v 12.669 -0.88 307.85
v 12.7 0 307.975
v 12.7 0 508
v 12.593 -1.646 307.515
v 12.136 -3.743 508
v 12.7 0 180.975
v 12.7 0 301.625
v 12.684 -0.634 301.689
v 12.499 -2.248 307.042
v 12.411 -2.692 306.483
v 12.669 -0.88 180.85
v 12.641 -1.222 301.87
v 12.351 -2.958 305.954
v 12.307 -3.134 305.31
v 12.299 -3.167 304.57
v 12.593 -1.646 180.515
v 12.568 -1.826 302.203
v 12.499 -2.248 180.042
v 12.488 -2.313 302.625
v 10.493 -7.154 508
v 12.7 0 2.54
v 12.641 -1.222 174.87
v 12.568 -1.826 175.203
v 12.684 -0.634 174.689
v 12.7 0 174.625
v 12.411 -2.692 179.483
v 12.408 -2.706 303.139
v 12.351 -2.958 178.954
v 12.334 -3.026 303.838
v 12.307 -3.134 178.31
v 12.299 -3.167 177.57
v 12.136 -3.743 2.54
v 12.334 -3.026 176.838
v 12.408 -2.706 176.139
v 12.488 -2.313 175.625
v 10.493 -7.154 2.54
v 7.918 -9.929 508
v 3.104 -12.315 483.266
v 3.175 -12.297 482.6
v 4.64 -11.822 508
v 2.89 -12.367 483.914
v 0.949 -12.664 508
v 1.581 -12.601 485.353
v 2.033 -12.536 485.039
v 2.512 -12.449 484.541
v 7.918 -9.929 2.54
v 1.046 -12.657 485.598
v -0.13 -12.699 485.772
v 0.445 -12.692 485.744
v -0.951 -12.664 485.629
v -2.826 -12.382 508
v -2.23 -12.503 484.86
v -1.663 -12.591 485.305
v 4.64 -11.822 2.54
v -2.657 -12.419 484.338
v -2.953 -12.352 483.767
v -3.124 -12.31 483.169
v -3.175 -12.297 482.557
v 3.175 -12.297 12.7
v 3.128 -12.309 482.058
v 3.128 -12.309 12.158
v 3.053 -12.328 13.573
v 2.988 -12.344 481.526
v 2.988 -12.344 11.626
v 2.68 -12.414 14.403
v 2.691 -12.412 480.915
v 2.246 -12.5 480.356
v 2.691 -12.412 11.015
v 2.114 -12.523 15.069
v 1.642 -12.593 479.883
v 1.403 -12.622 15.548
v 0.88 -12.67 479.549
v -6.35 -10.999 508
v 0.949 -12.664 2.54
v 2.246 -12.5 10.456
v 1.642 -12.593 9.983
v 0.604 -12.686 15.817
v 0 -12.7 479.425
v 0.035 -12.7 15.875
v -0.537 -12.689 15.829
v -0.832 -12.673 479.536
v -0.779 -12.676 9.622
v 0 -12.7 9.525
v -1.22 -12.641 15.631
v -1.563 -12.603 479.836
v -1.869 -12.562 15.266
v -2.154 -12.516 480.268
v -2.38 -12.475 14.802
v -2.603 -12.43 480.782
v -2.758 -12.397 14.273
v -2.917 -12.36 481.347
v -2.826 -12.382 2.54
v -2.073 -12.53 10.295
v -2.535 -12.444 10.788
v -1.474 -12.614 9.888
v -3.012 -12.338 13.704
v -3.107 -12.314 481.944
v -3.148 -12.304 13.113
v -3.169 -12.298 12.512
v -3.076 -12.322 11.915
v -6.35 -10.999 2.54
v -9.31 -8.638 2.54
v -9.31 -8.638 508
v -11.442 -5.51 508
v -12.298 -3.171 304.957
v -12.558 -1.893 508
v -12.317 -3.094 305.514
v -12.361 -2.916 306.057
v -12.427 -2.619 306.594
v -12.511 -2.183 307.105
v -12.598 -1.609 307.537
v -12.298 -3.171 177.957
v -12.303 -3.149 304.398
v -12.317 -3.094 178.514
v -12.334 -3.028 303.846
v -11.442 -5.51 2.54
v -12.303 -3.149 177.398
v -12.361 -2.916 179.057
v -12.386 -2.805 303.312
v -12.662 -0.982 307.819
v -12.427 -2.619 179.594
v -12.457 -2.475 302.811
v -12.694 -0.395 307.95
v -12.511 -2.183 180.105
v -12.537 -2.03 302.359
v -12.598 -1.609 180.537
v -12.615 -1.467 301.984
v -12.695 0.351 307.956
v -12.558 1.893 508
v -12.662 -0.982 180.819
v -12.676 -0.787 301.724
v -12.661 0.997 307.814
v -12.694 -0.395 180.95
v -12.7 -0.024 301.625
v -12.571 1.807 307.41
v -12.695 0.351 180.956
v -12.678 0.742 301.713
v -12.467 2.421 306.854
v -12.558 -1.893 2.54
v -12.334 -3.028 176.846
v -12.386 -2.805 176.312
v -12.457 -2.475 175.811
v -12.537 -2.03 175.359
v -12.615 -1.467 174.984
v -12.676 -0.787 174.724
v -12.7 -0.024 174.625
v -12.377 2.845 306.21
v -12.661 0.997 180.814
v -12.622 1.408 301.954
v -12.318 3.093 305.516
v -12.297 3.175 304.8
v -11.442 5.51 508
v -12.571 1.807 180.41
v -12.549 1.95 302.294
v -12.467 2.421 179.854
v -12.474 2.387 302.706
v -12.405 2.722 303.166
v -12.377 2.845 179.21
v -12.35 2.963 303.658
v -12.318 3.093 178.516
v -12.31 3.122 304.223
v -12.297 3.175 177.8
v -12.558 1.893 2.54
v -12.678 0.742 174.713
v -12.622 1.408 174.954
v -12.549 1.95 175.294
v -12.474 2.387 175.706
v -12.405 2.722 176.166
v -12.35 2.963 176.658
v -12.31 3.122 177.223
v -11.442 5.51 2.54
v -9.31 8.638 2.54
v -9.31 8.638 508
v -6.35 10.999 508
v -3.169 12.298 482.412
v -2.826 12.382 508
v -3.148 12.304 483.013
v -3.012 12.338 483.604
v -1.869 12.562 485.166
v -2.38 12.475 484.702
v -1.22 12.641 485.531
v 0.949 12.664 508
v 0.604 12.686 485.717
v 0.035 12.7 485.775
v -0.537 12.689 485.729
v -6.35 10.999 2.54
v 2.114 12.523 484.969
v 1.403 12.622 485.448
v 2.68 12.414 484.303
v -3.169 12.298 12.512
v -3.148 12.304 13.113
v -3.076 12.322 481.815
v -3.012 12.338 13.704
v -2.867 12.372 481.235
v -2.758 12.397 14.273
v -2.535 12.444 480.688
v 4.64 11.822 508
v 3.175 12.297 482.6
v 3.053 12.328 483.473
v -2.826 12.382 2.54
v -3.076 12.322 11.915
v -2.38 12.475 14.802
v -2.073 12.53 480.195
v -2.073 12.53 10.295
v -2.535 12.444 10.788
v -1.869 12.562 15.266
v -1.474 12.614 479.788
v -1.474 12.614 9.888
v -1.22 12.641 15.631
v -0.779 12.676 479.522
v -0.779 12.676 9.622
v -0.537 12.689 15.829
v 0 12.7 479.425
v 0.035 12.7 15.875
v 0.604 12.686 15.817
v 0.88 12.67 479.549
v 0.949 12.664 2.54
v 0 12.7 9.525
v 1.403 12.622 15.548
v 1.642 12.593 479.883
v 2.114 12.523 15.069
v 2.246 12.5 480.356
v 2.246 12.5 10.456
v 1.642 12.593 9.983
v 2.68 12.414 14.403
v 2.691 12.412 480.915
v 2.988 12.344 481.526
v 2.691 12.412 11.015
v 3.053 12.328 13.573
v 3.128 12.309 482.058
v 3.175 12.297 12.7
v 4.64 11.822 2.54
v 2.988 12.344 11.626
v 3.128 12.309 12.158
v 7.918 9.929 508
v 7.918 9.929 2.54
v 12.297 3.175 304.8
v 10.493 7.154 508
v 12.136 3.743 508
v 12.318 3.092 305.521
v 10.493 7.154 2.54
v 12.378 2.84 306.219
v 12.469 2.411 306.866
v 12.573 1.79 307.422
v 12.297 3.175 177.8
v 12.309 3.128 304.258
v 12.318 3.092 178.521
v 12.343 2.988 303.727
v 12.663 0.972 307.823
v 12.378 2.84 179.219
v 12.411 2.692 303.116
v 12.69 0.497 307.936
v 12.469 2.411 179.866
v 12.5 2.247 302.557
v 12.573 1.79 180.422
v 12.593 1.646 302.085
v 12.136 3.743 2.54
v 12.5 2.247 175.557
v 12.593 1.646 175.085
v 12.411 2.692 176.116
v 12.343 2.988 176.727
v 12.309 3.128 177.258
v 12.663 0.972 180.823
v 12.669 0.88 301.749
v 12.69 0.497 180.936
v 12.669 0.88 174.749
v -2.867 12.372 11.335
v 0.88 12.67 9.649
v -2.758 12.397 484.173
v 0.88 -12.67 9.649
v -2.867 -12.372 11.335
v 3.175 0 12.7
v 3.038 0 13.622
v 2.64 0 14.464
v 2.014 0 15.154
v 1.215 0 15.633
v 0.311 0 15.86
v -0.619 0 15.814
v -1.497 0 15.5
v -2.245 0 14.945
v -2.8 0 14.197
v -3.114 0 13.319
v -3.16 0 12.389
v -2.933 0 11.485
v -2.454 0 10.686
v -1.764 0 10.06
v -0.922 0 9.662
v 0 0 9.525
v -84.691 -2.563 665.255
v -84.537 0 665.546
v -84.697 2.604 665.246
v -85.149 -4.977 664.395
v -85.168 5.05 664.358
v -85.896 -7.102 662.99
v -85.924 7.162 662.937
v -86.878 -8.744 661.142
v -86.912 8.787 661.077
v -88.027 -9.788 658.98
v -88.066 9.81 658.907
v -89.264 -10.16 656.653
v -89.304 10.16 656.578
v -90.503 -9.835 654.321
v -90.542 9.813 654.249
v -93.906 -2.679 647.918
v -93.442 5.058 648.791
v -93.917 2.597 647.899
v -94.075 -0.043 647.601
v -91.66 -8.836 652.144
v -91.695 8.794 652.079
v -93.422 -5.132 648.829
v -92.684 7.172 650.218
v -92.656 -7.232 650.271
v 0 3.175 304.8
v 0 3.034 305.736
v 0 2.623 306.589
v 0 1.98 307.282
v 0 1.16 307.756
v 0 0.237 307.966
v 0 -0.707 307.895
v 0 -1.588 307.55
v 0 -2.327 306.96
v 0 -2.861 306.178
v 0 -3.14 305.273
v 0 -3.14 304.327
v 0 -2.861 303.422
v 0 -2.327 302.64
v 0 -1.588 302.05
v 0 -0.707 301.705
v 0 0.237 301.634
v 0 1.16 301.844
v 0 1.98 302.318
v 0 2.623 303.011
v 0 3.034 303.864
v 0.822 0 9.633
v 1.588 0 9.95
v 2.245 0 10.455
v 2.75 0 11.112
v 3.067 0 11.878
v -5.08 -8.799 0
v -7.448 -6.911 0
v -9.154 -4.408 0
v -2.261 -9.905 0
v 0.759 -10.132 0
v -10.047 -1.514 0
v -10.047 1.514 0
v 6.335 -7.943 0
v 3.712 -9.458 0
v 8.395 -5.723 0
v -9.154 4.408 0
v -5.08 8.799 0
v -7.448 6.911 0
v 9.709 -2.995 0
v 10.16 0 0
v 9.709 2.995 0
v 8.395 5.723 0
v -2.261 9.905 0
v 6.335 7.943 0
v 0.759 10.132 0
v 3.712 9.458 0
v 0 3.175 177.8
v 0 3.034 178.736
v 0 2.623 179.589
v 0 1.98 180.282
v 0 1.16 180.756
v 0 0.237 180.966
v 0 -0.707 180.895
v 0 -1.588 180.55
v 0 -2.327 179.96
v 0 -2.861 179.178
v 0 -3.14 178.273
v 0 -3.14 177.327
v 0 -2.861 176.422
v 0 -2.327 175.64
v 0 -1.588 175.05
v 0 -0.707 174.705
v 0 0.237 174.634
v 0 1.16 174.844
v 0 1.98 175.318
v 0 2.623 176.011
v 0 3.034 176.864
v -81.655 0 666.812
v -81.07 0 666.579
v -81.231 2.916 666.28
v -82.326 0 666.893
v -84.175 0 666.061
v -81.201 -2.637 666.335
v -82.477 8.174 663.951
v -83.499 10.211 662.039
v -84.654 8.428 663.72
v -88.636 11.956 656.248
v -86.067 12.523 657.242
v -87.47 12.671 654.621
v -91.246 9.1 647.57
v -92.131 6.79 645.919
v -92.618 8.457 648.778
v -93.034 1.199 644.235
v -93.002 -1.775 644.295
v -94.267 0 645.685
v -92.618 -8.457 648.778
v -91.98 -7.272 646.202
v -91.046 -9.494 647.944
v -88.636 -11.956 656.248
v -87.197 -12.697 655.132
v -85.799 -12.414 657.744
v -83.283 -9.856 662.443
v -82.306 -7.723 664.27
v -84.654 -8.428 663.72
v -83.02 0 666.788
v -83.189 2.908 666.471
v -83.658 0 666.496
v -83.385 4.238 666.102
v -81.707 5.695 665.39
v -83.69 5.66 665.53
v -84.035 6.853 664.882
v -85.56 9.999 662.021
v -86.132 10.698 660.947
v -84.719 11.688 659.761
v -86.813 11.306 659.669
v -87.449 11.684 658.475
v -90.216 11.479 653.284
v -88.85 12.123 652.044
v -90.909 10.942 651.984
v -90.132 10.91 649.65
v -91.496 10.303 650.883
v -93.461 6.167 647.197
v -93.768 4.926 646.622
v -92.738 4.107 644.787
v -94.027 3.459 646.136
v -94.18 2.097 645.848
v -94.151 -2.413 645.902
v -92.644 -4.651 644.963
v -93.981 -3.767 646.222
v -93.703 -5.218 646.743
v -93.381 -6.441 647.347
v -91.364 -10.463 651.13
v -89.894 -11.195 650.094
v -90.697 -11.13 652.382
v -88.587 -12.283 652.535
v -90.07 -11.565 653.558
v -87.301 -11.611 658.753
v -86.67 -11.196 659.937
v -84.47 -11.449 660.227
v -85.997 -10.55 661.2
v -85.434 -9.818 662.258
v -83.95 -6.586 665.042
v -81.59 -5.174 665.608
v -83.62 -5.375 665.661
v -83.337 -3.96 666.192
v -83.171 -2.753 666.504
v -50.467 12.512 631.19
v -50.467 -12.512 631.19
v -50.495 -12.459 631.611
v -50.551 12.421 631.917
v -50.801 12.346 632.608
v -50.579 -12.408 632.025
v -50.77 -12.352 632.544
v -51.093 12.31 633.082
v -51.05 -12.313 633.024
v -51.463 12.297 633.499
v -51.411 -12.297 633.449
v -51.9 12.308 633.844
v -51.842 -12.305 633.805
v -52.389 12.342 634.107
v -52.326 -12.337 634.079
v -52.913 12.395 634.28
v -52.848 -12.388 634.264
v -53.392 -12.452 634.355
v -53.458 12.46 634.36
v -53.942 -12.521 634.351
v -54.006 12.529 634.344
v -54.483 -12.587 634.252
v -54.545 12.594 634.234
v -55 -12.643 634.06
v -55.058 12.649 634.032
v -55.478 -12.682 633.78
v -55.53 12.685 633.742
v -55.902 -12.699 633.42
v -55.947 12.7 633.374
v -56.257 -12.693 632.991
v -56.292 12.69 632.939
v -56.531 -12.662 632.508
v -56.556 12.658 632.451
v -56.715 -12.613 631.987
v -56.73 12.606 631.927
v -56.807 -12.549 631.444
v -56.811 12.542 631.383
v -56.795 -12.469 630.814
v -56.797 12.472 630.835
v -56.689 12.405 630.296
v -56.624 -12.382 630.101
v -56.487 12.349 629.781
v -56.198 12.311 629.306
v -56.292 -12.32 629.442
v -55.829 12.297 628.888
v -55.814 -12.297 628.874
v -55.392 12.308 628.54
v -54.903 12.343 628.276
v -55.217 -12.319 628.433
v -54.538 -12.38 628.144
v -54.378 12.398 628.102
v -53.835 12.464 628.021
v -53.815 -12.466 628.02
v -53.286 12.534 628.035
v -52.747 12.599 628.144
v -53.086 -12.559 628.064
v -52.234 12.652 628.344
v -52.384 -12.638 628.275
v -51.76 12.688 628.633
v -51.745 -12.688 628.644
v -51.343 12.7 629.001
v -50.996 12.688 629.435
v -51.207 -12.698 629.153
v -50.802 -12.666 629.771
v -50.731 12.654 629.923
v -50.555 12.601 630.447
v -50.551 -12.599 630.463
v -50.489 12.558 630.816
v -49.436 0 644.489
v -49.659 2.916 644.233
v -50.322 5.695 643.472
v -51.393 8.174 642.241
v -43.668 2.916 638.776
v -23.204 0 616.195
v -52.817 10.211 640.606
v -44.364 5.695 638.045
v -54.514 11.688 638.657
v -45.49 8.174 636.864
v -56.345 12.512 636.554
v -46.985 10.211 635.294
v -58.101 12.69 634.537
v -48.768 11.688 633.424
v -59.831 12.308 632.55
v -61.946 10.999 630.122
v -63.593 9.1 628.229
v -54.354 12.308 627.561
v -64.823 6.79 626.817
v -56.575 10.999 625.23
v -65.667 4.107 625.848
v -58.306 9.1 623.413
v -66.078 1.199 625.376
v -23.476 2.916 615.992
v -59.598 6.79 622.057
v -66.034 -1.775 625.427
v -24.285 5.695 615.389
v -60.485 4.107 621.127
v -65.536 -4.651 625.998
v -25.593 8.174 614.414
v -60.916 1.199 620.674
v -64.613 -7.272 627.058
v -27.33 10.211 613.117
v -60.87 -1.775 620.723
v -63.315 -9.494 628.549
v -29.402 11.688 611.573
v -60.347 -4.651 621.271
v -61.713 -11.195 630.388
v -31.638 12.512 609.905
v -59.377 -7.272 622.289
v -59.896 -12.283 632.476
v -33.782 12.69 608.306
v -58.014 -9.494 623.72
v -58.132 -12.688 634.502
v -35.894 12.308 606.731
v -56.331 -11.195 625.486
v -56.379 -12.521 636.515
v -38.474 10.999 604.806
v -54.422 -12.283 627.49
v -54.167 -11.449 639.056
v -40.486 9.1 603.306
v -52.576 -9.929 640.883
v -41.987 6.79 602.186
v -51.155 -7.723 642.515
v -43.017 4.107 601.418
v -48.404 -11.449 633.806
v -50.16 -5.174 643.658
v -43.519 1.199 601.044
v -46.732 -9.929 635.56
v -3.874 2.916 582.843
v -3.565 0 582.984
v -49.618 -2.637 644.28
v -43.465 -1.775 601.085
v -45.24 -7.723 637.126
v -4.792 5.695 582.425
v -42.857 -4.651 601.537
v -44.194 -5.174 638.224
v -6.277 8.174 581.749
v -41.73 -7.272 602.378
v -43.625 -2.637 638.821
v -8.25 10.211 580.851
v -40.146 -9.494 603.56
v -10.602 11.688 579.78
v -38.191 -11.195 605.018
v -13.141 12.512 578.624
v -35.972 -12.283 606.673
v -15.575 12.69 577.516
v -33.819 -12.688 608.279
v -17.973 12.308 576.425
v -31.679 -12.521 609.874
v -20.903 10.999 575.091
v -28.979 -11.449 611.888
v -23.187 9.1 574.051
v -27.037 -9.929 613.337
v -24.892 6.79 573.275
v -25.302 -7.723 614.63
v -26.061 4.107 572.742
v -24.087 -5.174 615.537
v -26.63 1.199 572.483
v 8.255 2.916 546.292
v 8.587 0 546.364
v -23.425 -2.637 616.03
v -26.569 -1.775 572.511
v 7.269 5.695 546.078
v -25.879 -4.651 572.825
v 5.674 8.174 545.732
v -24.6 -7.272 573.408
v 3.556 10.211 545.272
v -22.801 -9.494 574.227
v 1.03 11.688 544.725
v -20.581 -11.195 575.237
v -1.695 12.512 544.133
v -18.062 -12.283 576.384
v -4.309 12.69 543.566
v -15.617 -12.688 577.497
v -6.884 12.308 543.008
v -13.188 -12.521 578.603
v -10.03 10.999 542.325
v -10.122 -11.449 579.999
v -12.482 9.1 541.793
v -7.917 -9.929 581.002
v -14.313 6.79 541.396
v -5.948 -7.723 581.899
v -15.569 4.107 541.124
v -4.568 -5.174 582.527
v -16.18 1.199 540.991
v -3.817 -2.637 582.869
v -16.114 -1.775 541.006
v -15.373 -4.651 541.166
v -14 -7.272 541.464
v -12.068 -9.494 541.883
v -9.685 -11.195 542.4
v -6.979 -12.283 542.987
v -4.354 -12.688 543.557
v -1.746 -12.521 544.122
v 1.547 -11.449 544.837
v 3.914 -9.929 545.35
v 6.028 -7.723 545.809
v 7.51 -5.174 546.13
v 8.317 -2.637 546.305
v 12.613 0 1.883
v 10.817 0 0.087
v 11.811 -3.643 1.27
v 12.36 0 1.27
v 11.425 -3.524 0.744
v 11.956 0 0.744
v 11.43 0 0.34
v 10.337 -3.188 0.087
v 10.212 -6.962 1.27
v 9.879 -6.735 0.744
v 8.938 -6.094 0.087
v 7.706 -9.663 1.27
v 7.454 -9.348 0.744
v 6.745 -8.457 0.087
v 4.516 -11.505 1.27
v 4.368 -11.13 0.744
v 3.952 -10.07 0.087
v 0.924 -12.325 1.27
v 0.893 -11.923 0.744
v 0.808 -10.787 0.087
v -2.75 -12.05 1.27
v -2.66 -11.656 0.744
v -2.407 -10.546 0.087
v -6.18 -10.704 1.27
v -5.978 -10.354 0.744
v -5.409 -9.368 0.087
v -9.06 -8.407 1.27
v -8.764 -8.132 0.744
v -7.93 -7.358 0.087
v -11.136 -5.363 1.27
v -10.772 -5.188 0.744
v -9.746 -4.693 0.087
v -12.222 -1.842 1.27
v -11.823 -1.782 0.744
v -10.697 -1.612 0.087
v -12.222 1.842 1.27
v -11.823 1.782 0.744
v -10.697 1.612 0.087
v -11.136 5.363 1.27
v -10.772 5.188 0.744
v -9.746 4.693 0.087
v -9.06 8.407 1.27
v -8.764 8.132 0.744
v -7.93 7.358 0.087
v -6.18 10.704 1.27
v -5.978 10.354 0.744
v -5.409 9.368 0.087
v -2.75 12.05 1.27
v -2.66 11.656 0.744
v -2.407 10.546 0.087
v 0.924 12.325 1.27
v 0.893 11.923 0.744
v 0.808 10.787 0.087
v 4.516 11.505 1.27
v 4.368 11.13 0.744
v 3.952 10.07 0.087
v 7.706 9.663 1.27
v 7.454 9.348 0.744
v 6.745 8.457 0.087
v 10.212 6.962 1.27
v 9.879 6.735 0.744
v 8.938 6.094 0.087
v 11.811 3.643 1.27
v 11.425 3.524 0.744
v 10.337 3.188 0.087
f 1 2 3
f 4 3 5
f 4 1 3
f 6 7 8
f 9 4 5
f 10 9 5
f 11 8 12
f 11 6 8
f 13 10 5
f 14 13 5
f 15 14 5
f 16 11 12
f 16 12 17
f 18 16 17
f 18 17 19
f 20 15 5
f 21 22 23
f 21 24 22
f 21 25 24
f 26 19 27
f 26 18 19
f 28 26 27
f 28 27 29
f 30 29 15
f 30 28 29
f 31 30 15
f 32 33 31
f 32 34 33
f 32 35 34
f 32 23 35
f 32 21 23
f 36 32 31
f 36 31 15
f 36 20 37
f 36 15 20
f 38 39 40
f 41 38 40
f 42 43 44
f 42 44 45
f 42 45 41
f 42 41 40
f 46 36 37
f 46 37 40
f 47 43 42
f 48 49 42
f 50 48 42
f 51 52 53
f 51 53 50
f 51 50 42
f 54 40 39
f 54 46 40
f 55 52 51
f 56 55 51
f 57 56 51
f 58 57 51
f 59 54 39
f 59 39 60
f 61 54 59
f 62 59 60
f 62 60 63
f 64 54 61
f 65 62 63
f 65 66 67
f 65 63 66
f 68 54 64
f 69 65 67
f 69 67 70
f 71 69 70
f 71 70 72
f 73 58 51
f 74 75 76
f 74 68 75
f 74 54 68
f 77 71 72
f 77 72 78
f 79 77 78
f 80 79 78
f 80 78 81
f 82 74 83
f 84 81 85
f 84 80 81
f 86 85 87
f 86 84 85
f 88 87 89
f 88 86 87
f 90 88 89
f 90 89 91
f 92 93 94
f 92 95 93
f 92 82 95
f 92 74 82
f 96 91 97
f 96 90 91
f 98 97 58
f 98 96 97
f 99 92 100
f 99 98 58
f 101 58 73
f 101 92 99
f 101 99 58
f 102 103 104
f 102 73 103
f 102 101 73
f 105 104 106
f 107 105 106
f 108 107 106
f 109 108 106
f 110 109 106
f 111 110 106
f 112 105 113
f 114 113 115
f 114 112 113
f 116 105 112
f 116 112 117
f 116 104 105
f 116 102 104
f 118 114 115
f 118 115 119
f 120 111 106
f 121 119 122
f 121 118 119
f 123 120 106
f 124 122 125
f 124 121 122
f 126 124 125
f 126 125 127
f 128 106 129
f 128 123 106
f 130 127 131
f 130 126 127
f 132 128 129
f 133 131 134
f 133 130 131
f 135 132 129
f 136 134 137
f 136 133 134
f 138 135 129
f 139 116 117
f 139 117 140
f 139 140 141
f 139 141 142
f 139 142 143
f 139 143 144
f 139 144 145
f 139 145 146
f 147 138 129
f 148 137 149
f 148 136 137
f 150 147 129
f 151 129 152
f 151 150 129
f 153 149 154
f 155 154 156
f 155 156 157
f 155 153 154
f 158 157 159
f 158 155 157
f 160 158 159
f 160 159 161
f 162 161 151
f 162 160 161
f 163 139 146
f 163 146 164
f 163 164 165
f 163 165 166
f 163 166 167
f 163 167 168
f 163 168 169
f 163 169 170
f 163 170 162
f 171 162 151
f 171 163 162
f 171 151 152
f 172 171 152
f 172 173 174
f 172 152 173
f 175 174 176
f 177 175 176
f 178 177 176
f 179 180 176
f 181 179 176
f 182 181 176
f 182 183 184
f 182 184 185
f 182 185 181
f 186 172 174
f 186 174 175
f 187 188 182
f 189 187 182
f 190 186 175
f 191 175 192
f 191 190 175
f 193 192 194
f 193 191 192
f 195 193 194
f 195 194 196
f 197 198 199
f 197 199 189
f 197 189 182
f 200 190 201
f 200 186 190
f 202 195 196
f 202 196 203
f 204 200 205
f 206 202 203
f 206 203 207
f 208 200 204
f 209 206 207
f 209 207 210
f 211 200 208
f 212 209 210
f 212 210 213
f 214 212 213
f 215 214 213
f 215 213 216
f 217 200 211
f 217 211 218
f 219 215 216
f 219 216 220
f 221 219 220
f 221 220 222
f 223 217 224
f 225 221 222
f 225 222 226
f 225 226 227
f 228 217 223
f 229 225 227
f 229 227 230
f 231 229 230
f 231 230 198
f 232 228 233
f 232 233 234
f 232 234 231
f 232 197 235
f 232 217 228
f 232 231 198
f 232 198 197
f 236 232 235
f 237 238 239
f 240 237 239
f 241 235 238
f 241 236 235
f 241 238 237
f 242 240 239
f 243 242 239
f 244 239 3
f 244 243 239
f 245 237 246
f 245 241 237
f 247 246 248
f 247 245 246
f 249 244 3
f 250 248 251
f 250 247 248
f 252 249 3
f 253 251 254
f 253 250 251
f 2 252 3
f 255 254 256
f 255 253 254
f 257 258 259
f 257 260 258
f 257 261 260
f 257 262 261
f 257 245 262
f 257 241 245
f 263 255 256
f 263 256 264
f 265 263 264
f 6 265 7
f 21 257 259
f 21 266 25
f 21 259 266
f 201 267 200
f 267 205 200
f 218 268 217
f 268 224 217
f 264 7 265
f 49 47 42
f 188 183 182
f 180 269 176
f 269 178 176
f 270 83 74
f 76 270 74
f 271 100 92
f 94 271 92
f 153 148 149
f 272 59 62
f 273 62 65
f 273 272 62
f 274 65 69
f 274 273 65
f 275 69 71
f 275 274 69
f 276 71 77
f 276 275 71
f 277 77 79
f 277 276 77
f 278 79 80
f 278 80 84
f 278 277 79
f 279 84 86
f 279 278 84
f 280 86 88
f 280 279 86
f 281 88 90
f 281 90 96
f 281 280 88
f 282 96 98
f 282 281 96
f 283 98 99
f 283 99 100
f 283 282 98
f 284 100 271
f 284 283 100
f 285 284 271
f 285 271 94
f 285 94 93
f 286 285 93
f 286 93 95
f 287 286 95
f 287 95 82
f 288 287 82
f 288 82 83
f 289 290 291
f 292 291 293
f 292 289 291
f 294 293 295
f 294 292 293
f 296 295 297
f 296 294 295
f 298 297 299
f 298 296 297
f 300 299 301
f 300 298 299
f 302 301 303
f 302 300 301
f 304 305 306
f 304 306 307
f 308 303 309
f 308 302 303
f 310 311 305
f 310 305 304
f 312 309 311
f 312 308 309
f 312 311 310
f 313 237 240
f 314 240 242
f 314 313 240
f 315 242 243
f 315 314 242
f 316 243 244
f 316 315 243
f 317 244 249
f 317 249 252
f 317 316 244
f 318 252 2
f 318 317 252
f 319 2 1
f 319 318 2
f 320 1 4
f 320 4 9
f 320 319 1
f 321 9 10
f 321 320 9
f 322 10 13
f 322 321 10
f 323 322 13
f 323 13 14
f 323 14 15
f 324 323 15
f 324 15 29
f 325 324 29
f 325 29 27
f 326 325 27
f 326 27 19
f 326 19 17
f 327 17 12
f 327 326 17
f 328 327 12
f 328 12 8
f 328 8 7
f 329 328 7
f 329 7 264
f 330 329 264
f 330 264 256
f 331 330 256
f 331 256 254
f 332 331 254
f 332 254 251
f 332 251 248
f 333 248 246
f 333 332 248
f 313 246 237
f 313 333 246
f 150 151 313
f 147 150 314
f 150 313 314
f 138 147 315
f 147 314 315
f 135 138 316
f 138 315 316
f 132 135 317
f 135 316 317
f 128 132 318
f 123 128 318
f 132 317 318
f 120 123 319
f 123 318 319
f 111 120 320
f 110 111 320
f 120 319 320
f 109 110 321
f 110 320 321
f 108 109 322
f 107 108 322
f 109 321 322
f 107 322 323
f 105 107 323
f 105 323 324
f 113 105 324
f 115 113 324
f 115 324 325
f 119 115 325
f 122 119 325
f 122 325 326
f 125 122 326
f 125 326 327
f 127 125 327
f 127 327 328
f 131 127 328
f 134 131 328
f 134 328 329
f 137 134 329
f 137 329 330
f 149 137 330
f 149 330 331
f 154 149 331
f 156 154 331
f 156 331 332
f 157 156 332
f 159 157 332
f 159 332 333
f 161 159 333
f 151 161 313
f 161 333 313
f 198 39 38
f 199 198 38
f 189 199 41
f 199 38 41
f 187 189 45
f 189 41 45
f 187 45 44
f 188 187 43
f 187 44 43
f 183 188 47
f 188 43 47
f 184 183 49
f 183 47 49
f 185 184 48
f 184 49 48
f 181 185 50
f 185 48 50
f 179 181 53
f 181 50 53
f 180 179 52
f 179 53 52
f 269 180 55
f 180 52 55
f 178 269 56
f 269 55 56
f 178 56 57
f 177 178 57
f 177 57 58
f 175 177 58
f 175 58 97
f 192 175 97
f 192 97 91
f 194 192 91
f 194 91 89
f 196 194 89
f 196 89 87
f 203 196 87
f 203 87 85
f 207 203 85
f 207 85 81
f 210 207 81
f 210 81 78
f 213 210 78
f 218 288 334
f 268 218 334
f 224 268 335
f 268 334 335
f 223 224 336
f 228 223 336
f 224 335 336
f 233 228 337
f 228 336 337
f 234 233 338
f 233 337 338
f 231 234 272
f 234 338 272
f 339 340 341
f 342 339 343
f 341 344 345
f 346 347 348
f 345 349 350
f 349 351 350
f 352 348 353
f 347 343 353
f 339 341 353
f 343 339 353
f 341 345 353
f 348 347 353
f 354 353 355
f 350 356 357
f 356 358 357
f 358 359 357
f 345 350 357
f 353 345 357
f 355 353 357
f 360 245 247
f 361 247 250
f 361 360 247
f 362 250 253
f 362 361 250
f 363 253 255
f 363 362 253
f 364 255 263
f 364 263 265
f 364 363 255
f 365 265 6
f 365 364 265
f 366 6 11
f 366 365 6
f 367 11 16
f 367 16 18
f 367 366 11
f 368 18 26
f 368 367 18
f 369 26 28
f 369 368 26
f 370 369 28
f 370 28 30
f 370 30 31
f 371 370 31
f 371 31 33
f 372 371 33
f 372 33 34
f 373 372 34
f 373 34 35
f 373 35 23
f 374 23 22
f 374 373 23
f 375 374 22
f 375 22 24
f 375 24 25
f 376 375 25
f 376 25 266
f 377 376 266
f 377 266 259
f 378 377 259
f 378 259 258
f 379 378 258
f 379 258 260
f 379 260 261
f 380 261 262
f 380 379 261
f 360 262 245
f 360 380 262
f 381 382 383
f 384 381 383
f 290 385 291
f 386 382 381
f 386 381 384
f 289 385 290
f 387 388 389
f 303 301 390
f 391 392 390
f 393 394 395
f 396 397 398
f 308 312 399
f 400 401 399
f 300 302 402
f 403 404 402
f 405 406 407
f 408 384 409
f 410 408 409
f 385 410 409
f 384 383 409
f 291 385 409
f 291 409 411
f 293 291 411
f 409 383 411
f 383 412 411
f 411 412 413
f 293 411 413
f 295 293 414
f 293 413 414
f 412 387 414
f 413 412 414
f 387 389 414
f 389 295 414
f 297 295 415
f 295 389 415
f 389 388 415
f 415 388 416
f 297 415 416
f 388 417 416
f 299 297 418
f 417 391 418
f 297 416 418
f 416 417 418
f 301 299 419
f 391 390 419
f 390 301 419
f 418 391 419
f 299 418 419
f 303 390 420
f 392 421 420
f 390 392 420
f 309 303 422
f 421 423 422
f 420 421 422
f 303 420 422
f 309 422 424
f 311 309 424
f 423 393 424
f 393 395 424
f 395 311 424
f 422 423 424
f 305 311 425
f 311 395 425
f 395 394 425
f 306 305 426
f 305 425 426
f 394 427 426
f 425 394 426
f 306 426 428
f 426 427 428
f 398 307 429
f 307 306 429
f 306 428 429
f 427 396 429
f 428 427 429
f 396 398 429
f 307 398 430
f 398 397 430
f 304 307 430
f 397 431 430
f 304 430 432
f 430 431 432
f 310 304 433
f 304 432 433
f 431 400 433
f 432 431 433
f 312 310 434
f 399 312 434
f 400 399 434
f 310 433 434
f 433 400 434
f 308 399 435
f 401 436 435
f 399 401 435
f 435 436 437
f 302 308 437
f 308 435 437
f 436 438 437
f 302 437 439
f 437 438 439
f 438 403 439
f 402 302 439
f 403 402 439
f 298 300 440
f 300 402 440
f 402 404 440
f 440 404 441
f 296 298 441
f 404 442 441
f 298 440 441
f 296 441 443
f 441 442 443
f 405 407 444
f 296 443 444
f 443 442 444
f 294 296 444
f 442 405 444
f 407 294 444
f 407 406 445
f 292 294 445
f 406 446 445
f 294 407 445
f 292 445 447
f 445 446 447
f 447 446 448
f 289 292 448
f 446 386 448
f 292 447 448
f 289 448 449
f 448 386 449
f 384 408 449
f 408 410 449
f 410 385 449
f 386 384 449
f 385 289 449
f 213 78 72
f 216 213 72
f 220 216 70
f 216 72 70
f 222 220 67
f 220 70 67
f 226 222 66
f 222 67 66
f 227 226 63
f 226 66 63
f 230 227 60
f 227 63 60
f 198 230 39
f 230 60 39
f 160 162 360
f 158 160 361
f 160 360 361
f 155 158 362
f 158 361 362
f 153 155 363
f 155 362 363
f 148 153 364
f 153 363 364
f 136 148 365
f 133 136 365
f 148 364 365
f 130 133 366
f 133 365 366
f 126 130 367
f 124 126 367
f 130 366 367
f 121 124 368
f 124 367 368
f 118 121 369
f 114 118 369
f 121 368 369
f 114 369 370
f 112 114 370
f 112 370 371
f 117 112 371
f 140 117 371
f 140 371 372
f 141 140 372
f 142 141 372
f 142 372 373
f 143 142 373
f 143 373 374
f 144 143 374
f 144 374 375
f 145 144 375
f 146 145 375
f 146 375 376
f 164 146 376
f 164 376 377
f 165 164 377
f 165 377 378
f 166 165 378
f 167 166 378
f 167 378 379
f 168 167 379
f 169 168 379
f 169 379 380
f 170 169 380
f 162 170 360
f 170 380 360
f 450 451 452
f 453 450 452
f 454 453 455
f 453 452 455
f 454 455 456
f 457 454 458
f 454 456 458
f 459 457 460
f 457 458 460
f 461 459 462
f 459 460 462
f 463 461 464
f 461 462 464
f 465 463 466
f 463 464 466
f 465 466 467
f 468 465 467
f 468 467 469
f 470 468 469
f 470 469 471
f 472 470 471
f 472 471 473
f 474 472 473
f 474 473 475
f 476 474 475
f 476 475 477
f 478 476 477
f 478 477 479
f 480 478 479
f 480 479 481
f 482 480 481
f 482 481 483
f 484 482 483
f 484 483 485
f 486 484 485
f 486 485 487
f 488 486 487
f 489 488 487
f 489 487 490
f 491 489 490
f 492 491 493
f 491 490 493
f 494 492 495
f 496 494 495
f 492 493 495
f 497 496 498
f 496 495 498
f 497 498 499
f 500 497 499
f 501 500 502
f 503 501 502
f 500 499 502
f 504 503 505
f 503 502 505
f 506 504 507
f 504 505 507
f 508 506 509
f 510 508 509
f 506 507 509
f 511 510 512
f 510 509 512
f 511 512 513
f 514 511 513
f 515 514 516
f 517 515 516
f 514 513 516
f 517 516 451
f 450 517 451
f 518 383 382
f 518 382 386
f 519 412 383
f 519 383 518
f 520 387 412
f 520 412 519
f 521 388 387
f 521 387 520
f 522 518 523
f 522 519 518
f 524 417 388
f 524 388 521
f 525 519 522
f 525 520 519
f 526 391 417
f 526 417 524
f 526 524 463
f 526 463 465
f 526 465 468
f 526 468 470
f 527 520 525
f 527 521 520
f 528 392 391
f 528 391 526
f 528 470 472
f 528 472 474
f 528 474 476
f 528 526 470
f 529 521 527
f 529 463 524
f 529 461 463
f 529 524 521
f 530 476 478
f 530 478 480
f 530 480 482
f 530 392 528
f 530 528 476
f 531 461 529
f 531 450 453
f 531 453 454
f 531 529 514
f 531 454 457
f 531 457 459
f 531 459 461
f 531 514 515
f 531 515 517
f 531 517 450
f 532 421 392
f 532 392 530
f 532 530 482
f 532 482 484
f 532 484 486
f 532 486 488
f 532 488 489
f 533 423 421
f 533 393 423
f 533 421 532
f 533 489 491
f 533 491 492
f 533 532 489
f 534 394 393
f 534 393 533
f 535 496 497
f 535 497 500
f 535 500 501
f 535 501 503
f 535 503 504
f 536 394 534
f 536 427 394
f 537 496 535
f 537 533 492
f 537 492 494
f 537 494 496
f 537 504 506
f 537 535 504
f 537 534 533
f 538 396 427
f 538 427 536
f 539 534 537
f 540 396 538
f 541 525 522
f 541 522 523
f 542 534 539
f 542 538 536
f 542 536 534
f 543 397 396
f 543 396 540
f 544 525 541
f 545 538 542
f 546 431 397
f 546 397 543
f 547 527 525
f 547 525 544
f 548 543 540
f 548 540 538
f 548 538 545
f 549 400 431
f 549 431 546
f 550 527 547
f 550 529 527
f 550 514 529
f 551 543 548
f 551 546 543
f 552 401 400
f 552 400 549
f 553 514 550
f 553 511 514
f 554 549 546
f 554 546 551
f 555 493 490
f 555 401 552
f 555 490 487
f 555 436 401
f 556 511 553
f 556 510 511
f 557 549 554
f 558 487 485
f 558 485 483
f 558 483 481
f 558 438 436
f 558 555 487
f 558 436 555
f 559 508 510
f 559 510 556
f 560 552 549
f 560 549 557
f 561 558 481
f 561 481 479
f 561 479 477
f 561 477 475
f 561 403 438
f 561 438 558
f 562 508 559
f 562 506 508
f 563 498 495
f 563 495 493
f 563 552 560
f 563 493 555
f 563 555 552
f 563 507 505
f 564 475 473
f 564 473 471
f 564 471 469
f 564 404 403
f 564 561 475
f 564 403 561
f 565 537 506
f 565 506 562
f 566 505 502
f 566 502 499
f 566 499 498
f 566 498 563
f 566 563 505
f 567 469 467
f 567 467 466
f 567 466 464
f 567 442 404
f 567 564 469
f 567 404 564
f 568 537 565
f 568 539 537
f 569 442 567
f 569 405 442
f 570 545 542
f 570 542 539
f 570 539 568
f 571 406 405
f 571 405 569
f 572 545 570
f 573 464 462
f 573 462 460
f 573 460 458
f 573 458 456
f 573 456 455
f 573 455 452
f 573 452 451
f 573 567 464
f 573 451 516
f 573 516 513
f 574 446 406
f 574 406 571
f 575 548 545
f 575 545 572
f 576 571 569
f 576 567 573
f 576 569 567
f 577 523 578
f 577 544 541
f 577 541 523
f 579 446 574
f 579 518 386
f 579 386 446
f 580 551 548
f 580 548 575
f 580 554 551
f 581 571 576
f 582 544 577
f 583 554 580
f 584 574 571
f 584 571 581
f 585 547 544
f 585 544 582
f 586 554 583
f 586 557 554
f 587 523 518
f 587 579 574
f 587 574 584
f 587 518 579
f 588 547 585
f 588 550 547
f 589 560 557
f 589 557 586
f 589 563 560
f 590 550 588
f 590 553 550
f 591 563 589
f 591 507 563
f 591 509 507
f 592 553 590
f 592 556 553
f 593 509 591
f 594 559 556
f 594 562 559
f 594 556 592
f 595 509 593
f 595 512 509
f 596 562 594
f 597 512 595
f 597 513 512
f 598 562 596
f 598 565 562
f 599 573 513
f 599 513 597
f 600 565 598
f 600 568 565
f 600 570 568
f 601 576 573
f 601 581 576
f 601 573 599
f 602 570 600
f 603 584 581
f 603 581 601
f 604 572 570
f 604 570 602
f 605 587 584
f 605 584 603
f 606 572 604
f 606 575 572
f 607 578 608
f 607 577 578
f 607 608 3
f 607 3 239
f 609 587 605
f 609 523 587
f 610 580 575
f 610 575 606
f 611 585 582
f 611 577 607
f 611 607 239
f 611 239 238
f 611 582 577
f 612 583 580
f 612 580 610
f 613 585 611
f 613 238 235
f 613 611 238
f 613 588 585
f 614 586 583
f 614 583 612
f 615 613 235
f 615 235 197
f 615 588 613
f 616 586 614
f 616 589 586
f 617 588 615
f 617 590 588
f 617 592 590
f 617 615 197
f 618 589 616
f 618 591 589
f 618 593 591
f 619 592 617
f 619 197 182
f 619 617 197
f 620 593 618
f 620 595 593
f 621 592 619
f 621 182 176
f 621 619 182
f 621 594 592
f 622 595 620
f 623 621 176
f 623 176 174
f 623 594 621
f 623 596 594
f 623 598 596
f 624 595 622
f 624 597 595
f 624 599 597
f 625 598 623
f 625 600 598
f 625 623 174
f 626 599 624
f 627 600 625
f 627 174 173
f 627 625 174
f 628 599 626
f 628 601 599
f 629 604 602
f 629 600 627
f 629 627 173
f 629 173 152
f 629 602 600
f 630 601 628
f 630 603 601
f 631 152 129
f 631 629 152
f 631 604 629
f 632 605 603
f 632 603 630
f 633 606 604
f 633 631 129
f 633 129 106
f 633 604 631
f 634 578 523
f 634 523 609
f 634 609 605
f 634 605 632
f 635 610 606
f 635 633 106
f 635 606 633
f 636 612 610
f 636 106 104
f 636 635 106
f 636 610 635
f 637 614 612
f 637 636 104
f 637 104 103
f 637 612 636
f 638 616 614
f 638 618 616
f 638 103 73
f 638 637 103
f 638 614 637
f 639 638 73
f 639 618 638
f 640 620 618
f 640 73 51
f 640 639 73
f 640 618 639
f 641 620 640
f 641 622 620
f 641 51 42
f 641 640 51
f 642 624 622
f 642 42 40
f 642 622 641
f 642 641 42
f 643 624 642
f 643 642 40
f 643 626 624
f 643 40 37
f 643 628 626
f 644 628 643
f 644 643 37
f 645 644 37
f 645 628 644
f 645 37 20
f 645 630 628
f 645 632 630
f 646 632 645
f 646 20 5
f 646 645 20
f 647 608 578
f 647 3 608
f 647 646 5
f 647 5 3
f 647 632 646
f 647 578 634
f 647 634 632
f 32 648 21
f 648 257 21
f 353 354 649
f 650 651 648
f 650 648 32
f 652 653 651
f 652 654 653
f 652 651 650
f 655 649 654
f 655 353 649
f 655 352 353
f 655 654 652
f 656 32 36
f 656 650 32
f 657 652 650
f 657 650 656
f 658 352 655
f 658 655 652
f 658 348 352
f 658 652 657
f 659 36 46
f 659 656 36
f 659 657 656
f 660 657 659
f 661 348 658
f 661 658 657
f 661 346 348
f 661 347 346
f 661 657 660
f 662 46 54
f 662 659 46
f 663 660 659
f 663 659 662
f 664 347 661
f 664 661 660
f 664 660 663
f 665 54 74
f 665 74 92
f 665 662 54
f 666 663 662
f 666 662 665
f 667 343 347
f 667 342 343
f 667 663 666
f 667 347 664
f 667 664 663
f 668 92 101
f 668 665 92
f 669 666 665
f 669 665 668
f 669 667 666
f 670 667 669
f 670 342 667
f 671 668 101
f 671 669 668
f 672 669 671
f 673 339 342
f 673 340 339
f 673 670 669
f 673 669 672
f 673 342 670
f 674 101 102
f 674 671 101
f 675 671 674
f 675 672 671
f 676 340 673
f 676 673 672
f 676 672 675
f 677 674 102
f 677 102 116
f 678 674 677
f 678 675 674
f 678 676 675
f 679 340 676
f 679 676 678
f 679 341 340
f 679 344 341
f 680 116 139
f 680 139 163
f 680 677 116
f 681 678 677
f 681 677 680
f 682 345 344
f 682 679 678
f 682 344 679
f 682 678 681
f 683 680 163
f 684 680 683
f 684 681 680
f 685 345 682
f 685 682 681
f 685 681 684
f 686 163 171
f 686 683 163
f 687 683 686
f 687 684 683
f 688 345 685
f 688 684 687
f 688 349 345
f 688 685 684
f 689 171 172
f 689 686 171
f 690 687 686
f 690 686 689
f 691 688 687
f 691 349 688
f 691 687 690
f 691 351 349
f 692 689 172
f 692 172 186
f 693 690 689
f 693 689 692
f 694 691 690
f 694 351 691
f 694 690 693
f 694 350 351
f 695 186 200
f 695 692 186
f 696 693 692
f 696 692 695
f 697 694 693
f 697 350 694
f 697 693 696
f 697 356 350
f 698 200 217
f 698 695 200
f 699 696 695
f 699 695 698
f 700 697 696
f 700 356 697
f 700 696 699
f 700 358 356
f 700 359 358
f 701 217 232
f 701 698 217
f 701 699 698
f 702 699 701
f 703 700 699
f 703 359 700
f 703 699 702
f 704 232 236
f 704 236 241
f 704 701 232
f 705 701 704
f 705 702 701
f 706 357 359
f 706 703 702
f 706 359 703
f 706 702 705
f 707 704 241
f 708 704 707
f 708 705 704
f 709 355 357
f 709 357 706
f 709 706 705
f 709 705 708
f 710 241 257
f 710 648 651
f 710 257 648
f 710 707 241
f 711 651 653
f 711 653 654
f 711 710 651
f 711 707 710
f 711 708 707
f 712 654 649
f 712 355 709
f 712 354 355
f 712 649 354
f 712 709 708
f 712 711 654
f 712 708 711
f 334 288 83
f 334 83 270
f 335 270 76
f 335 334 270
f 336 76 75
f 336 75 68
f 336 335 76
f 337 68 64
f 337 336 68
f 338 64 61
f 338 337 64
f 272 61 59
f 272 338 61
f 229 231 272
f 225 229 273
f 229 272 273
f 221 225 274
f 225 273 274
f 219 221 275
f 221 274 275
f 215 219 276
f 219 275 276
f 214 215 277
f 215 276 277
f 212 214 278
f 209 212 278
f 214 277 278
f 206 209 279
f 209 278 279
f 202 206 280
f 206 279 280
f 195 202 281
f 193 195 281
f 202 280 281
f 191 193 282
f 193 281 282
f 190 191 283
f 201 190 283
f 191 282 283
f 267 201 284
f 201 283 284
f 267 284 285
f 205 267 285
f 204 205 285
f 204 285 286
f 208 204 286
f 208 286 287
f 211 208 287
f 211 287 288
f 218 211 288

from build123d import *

# Parameters (mm, degrees)
F1_R           = 12.7
F3_R           = 2.54
F6_DEPTH       = 6.35
F6_DEPTH_BACK  = 31.75
F7_R           = 3.175
F8_DEPTH       = 40.64
F10_R          = 3.175
F11_DEPTH      = 6.35
F12_R          = 3.175
F13_DEPTH      = 19.05
F13_DEPTH_BACK = 25.4
F15_DEPTH      = 25.4
F15_DEPTH_BACK = 25.4


with BuildPart() as f2:
    # F2: sweep along a path in F0
    with BuildLine(Plane.XZ) as f2_path:
        ThreePointArc((-89.2972339832, 656.59), (-24.04175279, 594.6789825982), (0, 508))
        Line((0, 508), (0, 0))
    # F1 (on Top) → F2 (sweep)
    with BuildSketch(Plane.XY):
        Circle(F1_R)
    sweep(path=f2_path.line)

    # F3
    f3_edges = [f2.edges().sort_by_distance(p)[0] for p in [
        (-95.25782, 0, 645.37566),
        (-12.7, 0, 0),
    ]]
    fillet(f3_edges, radius=F3_R)

    # F5 (on offset) → F6 (cut, two sides)
    with BuildSketch(Plane.XZ.offset(12.7)) as f6_sk:
        with BuildLine():
            ThreePointArc((0, 479.425), (2.2450640303, 480.3549359697), (3.175, 482.6))
            ThreePointArc((3.175, 482.6), (-2.2450640303, 484.8450640303), (0, 479.425))
        make_face()
    extrude(amount=F6_DEPTH, mode=Mode.SUBTRACT)
    extrude(f6_sk.sketch, amount=-F6_DEPTH_BACK, mode=Mode.SUBTRACT)

    # F7 (on offset) → F8 (cut)
    with BuildSketch(Plane.XZ.offset(12.7)):
        with Locations((-53.642109759, 631.19)):
            Circle(F7_R)
    extrude(amount=-F8_DEPTH, mode=Mode.SUBTRACT)

    # F10 (on offset) → F11 (cut)
    with BuildSketch(Plane.XZ.offset(-12.7)):
        with Locations((-53.642109759, 631.19)):
            Circle(F10_R)
    extrude(amount=F11_DEPTH, mode=Mode.SUBTRACT)

    # F12 (on Right) → F13 (cut, two sides)
    with BuildSketch(Plane.YZ) as f13_sk:
        with Locations((0, 304.8)):
            Circle(F12_R)
        with Locations((0, 177.8)):
            Circle(F12_R)
    extrude(amount=F13_DEPTH, mode=Mode.SUBTRACT)
    extrude(f13_sk.sketch, amount=-F13_DEPTH_BACK, mode=Mode.SUBTRACT)

    # F14 (on Front) → F15 (cut, two sides)
    with BuildSketch(Plane.XZ) as f15_sk:
        with BuildLine():
            ThreePointArc((0, 9.525), (2.2450640303, 10.4549359697), (3.175, 12.7))
            ThreePointArc((3.175, 12.7), (-2.2450640303, 14.9450640303), (0, 9.525))
        make_face()
    extrude(amount=-F15_DEPTH, mode=Mode.SUBTRACT)
    extrude(f15_sk.sketch, amount=F15_DEPTH_BACK, mode=Mode.SUBTRACT)


solid = f2.part
